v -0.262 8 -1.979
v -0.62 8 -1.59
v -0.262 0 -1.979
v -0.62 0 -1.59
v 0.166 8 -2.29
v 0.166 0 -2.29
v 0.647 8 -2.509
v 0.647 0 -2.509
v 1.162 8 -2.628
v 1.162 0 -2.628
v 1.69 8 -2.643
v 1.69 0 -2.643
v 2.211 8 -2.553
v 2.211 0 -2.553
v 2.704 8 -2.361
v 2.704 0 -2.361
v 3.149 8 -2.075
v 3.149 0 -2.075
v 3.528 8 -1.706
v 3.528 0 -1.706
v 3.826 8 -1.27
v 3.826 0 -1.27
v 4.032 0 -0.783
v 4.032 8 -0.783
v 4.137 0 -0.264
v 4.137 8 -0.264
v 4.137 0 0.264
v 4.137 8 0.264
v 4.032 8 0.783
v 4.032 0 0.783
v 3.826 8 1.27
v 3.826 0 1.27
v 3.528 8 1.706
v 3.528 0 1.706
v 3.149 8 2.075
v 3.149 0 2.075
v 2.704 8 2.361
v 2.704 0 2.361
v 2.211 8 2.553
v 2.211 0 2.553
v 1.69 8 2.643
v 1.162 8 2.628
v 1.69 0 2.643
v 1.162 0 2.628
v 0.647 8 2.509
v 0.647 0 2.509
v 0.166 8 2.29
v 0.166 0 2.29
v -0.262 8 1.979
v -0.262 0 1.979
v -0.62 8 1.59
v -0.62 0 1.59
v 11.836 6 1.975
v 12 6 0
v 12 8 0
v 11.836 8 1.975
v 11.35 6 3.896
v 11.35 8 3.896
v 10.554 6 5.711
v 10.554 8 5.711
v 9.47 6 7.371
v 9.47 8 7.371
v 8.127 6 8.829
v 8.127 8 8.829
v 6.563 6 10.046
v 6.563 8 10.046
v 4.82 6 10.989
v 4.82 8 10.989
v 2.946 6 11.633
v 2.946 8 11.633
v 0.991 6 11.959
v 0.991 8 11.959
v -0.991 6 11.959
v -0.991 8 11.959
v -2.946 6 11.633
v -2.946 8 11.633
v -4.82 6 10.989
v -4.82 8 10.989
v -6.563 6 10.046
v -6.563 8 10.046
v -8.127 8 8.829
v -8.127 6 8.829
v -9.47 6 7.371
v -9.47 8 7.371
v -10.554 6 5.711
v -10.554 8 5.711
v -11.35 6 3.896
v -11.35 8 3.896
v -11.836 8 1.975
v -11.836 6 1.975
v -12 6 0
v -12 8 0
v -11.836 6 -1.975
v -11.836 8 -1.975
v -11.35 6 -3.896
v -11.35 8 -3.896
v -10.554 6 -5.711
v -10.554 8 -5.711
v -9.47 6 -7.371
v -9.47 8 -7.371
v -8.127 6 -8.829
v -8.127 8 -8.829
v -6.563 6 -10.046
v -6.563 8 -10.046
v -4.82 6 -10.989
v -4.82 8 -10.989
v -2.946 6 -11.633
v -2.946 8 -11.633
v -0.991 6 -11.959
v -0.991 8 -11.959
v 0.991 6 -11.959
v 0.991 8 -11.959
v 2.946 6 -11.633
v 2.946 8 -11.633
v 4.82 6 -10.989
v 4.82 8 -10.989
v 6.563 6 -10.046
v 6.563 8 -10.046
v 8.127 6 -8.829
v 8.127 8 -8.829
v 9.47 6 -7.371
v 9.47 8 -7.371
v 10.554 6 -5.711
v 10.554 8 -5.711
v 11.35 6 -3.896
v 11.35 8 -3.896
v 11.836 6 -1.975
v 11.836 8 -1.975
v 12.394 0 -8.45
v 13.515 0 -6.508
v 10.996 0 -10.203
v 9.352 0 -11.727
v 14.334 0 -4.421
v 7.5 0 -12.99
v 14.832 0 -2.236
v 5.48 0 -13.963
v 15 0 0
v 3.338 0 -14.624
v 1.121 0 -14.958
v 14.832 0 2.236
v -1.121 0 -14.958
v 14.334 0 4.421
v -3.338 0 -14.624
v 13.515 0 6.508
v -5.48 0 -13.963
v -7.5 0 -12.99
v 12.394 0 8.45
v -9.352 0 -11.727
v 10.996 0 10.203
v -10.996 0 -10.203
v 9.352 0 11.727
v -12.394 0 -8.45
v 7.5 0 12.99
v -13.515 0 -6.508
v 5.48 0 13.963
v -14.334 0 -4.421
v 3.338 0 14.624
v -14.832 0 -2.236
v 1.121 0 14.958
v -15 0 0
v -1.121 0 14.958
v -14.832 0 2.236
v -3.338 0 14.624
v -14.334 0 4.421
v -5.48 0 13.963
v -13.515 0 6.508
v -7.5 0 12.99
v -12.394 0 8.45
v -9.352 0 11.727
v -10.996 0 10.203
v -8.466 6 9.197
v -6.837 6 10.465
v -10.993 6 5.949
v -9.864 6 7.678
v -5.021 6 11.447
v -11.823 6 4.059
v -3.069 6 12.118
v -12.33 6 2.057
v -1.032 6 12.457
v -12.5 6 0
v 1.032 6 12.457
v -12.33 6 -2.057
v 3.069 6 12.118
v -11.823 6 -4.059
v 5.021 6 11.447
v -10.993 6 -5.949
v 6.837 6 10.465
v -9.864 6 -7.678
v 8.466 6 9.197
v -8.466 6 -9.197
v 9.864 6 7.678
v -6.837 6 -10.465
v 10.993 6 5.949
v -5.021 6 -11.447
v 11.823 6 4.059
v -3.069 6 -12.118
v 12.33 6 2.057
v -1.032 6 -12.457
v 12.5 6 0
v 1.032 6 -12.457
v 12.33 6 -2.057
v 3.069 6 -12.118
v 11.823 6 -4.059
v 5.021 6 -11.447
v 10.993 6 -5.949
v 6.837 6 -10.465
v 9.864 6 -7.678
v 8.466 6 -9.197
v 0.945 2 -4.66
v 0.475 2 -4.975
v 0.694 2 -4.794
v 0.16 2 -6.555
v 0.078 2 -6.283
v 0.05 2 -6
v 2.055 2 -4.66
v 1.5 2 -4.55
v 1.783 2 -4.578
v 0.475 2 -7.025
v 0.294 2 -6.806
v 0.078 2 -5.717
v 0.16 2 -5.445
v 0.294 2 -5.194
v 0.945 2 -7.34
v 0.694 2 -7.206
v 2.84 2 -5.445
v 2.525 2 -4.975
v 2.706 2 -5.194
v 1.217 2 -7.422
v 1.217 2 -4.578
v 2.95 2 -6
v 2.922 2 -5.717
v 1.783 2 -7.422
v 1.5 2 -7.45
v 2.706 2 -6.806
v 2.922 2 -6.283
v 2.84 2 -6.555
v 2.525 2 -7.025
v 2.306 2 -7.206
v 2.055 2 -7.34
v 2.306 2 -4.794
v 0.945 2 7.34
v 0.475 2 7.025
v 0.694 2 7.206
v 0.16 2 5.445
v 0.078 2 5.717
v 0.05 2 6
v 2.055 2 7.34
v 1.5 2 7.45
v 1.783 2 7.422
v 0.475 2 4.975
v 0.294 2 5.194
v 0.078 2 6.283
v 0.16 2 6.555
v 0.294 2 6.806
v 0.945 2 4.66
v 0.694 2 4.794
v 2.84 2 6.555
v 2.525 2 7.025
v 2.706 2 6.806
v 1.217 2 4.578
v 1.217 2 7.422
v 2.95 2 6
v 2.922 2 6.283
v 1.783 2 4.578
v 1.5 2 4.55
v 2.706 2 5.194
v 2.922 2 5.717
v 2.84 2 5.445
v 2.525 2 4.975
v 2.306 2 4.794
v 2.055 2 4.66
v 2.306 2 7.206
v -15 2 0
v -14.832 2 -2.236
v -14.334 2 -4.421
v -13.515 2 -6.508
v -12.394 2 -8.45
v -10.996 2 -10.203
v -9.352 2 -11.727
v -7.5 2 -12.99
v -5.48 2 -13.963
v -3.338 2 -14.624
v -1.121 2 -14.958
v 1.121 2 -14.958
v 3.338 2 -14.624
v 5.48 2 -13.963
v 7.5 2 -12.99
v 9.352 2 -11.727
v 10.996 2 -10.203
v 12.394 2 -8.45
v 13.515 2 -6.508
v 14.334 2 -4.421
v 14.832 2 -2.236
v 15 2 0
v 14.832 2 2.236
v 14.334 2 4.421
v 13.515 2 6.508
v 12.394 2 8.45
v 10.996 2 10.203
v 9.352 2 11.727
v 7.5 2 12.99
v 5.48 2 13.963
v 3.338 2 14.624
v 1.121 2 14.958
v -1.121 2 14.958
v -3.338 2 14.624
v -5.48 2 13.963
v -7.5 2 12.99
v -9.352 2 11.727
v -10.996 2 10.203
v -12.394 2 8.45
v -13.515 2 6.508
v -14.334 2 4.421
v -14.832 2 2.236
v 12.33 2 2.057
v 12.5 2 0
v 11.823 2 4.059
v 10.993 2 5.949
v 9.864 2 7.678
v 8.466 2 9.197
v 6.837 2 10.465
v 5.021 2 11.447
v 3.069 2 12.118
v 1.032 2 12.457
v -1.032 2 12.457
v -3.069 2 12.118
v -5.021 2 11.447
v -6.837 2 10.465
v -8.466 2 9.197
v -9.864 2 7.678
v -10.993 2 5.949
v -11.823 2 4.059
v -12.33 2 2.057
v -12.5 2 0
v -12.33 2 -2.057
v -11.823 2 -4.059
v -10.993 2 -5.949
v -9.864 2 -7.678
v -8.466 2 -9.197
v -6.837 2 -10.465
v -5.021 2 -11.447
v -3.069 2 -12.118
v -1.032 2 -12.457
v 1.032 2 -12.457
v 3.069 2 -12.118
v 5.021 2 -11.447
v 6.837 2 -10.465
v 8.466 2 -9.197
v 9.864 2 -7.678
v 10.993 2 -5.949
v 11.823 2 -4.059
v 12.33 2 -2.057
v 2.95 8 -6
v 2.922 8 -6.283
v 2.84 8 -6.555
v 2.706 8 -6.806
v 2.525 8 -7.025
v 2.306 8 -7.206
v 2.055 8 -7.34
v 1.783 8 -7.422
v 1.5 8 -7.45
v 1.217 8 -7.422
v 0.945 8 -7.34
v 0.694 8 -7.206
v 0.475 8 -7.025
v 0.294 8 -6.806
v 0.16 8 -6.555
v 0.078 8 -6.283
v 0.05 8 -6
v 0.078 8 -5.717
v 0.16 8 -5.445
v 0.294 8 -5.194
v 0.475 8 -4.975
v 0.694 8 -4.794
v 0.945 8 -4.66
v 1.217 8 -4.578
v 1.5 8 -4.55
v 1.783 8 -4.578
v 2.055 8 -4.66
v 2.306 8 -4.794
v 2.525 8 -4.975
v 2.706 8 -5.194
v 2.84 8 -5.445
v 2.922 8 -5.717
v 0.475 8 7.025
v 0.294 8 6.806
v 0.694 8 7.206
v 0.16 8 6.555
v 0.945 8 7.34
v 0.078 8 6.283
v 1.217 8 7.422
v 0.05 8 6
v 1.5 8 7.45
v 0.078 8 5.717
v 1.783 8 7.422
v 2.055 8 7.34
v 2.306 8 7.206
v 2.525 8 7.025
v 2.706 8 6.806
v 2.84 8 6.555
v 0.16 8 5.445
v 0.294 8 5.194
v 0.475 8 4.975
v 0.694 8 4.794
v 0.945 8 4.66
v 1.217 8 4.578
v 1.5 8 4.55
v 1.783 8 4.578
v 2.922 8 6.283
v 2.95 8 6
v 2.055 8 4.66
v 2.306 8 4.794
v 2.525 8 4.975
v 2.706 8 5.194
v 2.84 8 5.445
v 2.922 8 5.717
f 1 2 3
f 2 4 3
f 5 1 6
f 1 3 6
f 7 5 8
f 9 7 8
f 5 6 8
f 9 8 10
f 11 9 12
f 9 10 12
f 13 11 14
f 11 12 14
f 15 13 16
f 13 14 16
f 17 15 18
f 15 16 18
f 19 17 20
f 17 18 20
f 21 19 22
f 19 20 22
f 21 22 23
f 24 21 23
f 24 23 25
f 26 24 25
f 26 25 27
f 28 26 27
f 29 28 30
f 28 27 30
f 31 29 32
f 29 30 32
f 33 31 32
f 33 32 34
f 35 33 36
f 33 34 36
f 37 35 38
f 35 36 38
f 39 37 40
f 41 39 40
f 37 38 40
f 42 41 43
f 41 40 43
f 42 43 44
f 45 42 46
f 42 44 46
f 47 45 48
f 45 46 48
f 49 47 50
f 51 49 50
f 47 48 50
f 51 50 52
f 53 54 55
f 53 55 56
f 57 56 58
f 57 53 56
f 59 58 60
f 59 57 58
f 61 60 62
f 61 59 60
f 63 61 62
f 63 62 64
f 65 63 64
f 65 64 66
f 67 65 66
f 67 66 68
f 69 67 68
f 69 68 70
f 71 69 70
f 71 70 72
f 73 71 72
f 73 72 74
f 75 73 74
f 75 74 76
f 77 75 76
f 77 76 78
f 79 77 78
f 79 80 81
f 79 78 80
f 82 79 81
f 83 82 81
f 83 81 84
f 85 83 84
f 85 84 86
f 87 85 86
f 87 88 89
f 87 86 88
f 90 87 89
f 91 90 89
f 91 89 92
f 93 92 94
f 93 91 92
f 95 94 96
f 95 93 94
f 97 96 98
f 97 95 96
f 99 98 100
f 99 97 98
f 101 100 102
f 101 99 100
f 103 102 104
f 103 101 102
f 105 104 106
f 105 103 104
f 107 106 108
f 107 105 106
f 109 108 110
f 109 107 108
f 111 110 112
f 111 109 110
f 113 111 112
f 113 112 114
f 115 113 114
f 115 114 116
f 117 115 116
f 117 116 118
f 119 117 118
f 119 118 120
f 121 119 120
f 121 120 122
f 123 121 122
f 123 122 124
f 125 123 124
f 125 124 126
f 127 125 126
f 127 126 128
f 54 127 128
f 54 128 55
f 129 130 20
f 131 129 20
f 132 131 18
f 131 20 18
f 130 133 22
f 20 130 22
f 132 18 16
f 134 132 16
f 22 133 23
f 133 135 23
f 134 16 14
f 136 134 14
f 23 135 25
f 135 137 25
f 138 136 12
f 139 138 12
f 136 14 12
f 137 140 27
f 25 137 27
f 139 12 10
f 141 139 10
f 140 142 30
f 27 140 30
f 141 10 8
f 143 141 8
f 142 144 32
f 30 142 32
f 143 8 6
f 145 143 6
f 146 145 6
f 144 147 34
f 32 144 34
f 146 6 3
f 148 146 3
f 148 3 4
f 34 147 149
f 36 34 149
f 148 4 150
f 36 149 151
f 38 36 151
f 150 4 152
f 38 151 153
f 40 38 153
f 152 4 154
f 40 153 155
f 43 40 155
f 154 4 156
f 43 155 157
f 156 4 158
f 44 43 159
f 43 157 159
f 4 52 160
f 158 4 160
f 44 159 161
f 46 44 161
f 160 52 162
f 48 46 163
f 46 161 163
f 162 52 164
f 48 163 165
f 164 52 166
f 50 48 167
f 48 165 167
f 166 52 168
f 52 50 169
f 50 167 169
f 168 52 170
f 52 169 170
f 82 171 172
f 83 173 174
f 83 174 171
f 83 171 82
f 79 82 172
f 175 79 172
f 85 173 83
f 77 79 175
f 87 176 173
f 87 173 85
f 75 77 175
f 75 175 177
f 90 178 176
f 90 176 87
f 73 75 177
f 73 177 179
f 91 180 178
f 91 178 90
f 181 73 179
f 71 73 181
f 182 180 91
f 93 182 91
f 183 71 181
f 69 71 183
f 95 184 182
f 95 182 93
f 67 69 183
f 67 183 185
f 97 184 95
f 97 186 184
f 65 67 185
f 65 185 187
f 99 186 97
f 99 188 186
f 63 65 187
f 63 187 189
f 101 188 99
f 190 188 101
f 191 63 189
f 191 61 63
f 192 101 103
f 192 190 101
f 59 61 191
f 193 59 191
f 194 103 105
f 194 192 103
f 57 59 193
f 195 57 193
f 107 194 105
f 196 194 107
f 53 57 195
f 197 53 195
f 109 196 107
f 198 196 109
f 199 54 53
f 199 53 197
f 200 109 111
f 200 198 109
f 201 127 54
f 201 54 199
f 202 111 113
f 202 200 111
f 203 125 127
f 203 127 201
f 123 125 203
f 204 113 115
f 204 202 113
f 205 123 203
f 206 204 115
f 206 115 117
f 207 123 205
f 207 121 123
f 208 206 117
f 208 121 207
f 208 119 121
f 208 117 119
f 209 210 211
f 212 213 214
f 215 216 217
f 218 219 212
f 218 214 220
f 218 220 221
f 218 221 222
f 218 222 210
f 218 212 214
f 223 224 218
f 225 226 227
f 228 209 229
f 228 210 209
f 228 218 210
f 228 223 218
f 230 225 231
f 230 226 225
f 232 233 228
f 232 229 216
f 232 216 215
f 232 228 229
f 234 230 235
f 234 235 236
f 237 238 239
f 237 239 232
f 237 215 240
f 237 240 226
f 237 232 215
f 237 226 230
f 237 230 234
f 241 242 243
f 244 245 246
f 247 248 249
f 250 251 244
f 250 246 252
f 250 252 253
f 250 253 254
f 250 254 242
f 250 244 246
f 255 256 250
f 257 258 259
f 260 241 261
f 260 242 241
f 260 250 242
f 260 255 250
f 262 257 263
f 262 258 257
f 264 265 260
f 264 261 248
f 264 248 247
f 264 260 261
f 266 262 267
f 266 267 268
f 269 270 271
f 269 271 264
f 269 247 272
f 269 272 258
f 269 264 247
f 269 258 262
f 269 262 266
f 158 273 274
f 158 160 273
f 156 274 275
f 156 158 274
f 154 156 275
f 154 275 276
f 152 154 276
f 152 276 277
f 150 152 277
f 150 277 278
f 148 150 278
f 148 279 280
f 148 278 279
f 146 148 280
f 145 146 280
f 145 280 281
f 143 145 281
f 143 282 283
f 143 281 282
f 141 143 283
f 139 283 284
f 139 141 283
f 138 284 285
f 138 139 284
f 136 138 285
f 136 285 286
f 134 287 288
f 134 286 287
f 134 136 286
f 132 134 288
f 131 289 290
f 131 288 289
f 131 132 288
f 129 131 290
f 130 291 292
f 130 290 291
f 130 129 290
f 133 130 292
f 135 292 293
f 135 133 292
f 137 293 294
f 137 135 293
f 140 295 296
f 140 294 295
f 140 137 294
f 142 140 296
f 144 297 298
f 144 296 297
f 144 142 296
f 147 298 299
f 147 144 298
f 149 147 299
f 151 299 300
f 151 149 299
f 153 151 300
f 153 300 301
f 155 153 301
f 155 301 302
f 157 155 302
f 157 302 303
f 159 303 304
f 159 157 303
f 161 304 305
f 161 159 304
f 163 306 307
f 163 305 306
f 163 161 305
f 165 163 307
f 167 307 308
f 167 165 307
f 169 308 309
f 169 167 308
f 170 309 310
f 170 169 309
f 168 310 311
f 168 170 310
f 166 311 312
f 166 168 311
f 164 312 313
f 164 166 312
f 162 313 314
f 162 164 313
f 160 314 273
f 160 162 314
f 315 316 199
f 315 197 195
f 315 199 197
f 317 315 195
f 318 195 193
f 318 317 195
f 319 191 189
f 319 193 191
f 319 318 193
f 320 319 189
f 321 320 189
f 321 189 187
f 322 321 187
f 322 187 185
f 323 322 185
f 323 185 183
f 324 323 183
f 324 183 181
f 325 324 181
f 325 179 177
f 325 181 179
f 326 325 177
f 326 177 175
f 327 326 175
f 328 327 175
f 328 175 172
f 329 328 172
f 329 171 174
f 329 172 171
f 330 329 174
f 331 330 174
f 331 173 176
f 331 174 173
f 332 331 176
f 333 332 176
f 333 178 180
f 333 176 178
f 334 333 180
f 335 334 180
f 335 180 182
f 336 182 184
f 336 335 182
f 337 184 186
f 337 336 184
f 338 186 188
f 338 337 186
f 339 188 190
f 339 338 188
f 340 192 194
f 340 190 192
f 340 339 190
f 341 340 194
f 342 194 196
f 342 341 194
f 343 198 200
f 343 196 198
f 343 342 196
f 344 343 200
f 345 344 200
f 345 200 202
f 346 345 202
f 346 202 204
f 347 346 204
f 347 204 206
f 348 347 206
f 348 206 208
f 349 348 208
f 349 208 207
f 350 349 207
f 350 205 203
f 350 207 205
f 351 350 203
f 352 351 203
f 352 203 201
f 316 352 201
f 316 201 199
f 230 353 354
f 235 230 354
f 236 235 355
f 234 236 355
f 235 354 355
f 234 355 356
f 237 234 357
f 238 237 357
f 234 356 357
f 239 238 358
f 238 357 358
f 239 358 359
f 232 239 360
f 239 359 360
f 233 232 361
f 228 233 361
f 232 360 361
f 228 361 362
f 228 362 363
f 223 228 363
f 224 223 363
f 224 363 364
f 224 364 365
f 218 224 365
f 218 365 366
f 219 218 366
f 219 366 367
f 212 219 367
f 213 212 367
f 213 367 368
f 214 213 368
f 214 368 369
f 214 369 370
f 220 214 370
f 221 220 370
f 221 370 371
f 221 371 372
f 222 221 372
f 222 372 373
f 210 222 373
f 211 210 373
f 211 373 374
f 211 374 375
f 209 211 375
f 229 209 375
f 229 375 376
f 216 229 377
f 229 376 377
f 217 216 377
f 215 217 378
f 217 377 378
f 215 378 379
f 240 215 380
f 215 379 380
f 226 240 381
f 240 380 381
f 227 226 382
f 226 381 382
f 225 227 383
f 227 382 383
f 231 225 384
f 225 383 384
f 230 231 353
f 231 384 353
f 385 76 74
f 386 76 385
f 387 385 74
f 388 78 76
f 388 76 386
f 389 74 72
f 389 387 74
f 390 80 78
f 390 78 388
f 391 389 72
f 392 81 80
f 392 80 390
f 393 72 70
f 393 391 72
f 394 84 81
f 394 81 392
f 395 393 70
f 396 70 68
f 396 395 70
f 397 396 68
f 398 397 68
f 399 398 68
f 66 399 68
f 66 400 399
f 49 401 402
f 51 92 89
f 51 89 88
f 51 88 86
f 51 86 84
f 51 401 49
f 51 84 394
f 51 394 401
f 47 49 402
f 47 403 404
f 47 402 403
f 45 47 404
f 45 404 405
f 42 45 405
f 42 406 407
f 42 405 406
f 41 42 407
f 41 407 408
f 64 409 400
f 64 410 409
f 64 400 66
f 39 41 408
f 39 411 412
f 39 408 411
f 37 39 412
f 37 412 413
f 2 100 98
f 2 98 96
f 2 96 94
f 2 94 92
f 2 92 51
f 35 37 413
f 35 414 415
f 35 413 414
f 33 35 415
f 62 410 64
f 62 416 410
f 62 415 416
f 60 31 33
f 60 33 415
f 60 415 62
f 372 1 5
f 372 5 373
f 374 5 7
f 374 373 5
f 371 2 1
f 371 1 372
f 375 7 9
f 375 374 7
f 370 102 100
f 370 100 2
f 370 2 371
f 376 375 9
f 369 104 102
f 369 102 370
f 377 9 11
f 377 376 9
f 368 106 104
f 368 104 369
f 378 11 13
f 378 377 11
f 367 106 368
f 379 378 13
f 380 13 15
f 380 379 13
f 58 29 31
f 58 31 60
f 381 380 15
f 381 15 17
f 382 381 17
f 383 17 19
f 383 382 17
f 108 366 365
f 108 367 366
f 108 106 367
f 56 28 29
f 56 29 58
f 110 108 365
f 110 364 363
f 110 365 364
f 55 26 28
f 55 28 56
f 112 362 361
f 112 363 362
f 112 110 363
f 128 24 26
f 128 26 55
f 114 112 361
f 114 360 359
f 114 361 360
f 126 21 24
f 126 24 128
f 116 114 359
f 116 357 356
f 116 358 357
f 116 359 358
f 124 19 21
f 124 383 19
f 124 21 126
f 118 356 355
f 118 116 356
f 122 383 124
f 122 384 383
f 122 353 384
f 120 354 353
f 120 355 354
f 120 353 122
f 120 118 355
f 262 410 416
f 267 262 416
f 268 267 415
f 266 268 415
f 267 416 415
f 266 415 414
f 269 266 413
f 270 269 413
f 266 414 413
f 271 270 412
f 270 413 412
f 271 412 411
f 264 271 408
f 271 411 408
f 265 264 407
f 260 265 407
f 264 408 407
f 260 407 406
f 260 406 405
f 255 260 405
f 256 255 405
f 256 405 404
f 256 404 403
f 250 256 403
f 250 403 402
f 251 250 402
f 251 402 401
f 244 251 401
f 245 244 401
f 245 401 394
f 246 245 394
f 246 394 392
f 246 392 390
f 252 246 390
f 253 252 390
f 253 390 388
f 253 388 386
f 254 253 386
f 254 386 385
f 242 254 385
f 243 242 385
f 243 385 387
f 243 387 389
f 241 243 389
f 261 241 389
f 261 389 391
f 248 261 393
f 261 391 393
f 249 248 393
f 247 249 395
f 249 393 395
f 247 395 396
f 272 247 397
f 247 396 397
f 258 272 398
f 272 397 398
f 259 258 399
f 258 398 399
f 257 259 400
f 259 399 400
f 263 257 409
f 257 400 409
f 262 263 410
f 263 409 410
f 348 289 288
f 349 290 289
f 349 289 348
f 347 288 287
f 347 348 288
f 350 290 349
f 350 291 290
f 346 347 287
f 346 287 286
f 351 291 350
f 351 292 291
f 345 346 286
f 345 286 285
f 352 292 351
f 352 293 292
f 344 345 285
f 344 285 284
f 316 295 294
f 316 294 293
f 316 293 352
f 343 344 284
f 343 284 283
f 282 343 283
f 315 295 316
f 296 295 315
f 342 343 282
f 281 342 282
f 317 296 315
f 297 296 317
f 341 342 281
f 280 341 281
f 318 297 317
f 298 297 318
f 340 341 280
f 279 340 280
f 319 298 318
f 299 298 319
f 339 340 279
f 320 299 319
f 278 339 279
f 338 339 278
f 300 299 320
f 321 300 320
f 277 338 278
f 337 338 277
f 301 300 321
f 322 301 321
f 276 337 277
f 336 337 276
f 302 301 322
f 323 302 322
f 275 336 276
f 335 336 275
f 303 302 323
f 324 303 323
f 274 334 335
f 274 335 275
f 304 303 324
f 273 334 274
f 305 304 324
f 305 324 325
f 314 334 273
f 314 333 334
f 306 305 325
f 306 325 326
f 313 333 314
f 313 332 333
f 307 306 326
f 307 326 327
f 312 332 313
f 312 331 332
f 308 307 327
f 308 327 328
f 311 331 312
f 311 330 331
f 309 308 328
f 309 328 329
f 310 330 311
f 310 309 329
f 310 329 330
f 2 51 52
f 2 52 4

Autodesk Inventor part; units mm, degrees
ref_plane "YZ Plane" through (0, 0, 0) normal (1, 0, 0) x (0, 1, 0)
ref_plane "XZ Plane" through (0, 0, 0) normal (0, 1, 0) x (-1, 0, 0)
ref_plane "XY Plane" through (0, 0, 0) normal (0, 0, 1) x (1, 0, 0)
sketch "Szkic1" plane through (0, 0, 0) normal (0, 1, 0) x (-1, 0, 0)
  circle A0 centre (0, 0) radius 15
  dimension "d0" = 30
extrude "Wyciągnięcie proste1" add sketch "Szkic1" along normal blind 2
sketch "Szkic2" plane through (0, 2, 0) normal (0, 1, 0) x (1, 0, 0)
  circle A0 centre (0, 0) radius 12.5
  dimension "d3" = 25
extrude "Wyciągnięcie proste2" add sketch "Szkic2" along normal blind 4
sketch "Szkic9" plane through (0, 6, 0) normal (0, 1, 0) x (1, 0, 0)
  circle A0 centre (0, 0) radius 12
  dimension "d22" = 24
extrude "Wyciągnięcie proste7" add sketch "Szkic9" along normal blind 2
sketch "Szkic11" plane through (0, 8, 0) normal (0, 1, 0) x (1, 0, 0)
  circle A0 centre (1.5, -6) radius 1.45
  circle A1 centre (1.5, 6) radius 1.45
  point P0 (0, 0)
  dimension "d25" = 2.9
  dimension "d26" = 2.9
extrude "Wyciągnięcie proste8" cut sketch "Szkic11" against normal blind 6
sketch "Szkic5" plane through (0, 0, 0) normal (0, -1, 0) x (1, 0, 0)
  arc A0 (-0.62, -1.59) -> (-0.62, 1.59) centre (1.5, 0) ccw
  line L0 (-0.62, 1.59) -> (-0.62, -1.59)
  point P0 (0, 0)
extrude "Wyciągnięcie proste5" cut sketch "Szkic5" against normal blind 8
properties part number "Rotor_shaft_21"
